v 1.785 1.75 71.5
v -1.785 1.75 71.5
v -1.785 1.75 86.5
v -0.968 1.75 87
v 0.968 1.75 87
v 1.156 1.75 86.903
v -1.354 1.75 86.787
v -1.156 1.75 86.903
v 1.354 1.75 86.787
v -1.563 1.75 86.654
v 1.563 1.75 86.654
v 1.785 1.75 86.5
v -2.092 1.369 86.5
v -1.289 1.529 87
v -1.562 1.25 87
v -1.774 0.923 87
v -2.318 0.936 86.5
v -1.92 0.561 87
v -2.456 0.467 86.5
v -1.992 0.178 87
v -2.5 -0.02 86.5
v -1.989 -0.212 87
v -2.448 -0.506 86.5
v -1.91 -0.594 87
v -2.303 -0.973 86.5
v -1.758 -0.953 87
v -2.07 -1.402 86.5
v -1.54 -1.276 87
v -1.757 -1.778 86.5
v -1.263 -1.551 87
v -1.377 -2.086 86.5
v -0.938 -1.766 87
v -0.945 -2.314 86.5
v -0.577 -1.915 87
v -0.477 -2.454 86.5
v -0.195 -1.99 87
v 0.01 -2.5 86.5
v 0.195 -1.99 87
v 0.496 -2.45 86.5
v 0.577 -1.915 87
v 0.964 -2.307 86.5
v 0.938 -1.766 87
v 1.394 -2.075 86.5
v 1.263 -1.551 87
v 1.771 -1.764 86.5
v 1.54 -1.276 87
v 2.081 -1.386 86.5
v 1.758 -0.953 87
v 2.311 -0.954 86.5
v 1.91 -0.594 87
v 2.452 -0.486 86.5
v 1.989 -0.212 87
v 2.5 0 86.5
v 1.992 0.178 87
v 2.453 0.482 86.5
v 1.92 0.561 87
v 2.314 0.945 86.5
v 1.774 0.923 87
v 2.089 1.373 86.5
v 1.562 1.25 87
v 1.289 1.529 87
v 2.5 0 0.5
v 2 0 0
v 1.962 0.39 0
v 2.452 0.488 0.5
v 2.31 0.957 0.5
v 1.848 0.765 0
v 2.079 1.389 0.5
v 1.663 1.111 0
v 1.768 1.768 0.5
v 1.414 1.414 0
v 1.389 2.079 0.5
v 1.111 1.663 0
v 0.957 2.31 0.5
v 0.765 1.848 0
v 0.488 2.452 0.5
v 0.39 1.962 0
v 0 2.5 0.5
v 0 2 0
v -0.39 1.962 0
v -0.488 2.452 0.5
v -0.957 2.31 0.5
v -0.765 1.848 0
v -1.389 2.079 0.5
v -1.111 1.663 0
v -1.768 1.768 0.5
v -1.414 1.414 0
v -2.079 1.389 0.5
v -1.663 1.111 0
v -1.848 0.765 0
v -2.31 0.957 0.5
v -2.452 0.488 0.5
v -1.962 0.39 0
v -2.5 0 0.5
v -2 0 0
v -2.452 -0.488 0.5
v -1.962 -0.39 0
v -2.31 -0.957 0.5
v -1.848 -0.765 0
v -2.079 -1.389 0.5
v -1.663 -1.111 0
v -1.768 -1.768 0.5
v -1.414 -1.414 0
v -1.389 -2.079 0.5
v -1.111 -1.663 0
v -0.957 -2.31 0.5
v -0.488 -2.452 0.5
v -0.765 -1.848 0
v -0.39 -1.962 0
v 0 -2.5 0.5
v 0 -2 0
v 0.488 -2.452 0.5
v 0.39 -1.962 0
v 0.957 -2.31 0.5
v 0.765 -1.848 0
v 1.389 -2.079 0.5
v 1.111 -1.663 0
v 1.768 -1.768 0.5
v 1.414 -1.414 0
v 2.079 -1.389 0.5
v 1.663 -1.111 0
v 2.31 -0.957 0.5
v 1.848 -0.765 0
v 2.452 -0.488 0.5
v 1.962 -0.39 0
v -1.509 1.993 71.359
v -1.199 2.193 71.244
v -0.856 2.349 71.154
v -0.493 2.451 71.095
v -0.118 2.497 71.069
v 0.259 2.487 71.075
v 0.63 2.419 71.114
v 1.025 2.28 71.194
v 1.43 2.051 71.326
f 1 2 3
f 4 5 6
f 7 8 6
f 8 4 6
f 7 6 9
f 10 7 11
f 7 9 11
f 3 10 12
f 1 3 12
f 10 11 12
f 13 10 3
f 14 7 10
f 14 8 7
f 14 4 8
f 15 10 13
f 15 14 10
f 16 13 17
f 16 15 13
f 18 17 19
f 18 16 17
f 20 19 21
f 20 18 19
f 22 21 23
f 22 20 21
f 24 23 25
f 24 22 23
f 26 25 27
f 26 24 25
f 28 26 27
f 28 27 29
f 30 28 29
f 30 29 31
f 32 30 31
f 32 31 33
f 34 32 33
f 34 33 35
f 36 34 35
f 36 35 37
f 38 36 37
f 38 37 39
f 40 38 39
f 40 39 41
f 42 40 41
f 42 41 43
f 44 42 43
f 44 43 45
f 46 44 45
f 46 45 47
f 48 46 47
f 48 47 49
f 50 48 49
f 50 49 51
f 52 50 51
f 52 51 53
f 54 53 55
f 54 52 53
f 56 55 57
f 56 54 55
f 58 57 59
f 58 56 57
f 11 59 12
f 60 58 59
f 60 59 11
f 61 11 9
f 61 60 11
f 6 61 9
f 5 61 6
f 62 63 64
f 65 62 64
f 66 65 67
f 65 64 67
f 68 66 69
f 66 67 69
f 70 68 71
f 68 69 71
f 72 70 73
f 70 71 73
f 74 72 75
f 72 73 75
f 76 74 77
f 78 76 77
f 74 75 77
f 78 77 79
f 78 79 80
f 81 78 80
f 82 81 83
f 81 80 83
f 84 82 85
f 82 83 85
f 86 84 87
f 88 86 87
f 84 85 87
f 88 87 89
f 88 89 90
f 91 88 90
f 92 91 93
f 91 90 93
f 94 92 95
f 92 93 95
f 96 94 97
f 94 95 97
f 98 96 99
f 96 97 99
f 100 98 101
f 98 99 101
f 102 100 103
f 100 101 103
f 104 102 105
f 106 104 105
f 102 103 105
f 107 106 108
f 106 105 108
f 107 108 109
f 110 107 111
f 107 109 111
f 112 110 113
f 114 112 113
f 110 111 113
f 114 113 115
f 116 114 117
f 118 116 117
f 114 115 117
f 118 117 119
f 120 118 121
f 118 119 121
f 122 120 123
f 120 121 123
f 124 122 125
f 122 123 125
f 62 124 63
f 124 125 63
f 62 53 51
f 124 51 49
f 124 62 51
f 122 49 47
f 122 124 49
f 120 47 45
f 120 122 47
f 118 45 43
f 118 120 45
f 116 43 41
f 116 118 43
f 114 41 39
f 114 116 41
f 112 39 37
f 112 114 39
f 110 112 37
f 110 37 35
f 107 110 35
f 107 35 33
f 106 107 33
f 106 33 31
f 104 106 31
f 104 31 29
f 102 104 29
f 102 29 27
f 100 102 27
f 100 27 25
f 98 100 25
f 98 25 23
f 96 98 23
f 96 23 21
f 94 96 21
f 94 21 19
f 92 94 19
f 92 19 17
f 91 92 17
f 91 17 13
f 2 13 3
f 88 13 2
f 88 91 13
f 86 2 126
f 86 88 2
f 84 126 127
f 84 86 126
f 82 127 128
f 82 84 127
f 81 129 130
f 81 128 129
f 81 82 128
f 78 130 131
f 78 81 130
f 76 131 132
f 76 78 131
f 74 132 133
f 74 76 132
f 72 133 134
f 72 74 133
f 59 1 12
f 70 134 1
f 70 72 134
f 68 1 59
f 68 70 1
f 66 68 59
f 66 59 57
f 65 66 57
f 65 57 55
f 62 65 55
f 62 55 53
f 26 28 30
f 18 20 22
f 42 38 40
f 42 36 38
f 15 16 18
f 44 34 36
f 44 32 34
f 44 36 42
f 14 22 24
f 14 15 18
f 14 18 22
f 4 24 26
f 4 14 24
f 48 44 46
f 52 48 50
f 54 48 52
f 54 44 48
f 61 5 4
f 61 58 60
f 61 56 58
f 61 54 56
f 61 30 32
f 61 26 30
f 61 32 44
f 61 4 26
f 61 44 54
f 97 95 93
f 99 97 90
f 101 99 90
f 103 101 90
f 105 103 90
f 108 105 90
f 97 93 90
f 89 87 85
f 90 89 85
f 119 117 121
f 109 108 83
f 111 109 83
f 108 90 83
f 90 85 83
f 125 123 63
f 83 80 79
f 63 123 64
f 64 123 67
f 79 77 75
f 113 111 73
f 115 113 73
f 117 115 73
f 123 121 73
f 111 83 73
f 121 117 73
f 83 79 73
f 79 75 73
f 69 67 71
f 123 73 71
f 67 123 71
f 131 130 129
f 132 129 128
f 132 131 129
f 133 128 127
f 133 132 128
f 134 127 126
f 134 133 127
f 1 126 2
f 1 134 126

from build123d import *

# Parameters (mm, degrees)
SKETCH1_R           = 2.5
BOSS_EXTRUDE1_DEPTH = 87
SKETCH2_W           = 5
SKETCH2_H           = 0.75
CUT_EXTRUDE1_DEPTH  = 16
CHAMFER1_SIZE       = 0.5
CHAMFER2_SIZE       = 0.866025404
CHAMFER2_SIZE_2     = 0.5


with BuildPart() as part:
    # Sketch1 → Boss-Extrude1 (new body)
    with BuildSketch(Plane.XY):
        Circle(SKETCH1_R)
    extrude(amount=BOSS_EXTRUDE1_DEPTH)

    # Sketch2 → Cut-Extrude1 (cut)
    with BuildSketch(Plane.XY.offset(87)):
        with Locations((0, 2.125)):
            Rectangle(SKETCH2_W, SKETCH2_H)
    extrude(amount=-CUT_EXTRUDE1_DEPTH, mode=Mode.SUBTRACT)

    # Chamfer1
    chamfer1_edges = [part.edges().sort_by_distance(p)[0] for p in [
        (-2.5, 0, 0),
        (-0.945147404, -2.314453798, 87),
    ]]
    chamfer(chamfer1_edges, length=CHAMFER1_SIZE)

    # Chamfer2
    # the kernel refuses this chamfer: 0.866025404, 0.5 mm, written as the material it adds along each edge
    with BuildSketch(Plane(origin=(4.025839092, 1.75, 71), x_dir=(0, 0.999813220622208, -0.01932676561269574), z_dir=(-1, 0, 0))) as chamfer2_piece_1_section:
        Polygon((CHAMFER2_SIZE * 0.999813220373, -CHAMFER2_SIZE * 0.0193267656079), (-CHAMFER2_SIZE_2 * 0.0193267656127, -CHAMFER2_SIZE_2 * 0.999813220622), (0, 0), align=None)
    chamfer2_piece_1 = extrude(amount=8.051678185, mode=Mode.PRIVATE)
    chamfer2_piece_1 = chamfer2_piece_1 & Plane(origin=(0, 0, 71.180869941), x_dir=(1, 0, 0), z_dir=(0, 0, -1)) * Cylinder(2.5, 20, mode=Mode.PRIVATE)
    add(chamfer2_piece_1)


solid = part.part
